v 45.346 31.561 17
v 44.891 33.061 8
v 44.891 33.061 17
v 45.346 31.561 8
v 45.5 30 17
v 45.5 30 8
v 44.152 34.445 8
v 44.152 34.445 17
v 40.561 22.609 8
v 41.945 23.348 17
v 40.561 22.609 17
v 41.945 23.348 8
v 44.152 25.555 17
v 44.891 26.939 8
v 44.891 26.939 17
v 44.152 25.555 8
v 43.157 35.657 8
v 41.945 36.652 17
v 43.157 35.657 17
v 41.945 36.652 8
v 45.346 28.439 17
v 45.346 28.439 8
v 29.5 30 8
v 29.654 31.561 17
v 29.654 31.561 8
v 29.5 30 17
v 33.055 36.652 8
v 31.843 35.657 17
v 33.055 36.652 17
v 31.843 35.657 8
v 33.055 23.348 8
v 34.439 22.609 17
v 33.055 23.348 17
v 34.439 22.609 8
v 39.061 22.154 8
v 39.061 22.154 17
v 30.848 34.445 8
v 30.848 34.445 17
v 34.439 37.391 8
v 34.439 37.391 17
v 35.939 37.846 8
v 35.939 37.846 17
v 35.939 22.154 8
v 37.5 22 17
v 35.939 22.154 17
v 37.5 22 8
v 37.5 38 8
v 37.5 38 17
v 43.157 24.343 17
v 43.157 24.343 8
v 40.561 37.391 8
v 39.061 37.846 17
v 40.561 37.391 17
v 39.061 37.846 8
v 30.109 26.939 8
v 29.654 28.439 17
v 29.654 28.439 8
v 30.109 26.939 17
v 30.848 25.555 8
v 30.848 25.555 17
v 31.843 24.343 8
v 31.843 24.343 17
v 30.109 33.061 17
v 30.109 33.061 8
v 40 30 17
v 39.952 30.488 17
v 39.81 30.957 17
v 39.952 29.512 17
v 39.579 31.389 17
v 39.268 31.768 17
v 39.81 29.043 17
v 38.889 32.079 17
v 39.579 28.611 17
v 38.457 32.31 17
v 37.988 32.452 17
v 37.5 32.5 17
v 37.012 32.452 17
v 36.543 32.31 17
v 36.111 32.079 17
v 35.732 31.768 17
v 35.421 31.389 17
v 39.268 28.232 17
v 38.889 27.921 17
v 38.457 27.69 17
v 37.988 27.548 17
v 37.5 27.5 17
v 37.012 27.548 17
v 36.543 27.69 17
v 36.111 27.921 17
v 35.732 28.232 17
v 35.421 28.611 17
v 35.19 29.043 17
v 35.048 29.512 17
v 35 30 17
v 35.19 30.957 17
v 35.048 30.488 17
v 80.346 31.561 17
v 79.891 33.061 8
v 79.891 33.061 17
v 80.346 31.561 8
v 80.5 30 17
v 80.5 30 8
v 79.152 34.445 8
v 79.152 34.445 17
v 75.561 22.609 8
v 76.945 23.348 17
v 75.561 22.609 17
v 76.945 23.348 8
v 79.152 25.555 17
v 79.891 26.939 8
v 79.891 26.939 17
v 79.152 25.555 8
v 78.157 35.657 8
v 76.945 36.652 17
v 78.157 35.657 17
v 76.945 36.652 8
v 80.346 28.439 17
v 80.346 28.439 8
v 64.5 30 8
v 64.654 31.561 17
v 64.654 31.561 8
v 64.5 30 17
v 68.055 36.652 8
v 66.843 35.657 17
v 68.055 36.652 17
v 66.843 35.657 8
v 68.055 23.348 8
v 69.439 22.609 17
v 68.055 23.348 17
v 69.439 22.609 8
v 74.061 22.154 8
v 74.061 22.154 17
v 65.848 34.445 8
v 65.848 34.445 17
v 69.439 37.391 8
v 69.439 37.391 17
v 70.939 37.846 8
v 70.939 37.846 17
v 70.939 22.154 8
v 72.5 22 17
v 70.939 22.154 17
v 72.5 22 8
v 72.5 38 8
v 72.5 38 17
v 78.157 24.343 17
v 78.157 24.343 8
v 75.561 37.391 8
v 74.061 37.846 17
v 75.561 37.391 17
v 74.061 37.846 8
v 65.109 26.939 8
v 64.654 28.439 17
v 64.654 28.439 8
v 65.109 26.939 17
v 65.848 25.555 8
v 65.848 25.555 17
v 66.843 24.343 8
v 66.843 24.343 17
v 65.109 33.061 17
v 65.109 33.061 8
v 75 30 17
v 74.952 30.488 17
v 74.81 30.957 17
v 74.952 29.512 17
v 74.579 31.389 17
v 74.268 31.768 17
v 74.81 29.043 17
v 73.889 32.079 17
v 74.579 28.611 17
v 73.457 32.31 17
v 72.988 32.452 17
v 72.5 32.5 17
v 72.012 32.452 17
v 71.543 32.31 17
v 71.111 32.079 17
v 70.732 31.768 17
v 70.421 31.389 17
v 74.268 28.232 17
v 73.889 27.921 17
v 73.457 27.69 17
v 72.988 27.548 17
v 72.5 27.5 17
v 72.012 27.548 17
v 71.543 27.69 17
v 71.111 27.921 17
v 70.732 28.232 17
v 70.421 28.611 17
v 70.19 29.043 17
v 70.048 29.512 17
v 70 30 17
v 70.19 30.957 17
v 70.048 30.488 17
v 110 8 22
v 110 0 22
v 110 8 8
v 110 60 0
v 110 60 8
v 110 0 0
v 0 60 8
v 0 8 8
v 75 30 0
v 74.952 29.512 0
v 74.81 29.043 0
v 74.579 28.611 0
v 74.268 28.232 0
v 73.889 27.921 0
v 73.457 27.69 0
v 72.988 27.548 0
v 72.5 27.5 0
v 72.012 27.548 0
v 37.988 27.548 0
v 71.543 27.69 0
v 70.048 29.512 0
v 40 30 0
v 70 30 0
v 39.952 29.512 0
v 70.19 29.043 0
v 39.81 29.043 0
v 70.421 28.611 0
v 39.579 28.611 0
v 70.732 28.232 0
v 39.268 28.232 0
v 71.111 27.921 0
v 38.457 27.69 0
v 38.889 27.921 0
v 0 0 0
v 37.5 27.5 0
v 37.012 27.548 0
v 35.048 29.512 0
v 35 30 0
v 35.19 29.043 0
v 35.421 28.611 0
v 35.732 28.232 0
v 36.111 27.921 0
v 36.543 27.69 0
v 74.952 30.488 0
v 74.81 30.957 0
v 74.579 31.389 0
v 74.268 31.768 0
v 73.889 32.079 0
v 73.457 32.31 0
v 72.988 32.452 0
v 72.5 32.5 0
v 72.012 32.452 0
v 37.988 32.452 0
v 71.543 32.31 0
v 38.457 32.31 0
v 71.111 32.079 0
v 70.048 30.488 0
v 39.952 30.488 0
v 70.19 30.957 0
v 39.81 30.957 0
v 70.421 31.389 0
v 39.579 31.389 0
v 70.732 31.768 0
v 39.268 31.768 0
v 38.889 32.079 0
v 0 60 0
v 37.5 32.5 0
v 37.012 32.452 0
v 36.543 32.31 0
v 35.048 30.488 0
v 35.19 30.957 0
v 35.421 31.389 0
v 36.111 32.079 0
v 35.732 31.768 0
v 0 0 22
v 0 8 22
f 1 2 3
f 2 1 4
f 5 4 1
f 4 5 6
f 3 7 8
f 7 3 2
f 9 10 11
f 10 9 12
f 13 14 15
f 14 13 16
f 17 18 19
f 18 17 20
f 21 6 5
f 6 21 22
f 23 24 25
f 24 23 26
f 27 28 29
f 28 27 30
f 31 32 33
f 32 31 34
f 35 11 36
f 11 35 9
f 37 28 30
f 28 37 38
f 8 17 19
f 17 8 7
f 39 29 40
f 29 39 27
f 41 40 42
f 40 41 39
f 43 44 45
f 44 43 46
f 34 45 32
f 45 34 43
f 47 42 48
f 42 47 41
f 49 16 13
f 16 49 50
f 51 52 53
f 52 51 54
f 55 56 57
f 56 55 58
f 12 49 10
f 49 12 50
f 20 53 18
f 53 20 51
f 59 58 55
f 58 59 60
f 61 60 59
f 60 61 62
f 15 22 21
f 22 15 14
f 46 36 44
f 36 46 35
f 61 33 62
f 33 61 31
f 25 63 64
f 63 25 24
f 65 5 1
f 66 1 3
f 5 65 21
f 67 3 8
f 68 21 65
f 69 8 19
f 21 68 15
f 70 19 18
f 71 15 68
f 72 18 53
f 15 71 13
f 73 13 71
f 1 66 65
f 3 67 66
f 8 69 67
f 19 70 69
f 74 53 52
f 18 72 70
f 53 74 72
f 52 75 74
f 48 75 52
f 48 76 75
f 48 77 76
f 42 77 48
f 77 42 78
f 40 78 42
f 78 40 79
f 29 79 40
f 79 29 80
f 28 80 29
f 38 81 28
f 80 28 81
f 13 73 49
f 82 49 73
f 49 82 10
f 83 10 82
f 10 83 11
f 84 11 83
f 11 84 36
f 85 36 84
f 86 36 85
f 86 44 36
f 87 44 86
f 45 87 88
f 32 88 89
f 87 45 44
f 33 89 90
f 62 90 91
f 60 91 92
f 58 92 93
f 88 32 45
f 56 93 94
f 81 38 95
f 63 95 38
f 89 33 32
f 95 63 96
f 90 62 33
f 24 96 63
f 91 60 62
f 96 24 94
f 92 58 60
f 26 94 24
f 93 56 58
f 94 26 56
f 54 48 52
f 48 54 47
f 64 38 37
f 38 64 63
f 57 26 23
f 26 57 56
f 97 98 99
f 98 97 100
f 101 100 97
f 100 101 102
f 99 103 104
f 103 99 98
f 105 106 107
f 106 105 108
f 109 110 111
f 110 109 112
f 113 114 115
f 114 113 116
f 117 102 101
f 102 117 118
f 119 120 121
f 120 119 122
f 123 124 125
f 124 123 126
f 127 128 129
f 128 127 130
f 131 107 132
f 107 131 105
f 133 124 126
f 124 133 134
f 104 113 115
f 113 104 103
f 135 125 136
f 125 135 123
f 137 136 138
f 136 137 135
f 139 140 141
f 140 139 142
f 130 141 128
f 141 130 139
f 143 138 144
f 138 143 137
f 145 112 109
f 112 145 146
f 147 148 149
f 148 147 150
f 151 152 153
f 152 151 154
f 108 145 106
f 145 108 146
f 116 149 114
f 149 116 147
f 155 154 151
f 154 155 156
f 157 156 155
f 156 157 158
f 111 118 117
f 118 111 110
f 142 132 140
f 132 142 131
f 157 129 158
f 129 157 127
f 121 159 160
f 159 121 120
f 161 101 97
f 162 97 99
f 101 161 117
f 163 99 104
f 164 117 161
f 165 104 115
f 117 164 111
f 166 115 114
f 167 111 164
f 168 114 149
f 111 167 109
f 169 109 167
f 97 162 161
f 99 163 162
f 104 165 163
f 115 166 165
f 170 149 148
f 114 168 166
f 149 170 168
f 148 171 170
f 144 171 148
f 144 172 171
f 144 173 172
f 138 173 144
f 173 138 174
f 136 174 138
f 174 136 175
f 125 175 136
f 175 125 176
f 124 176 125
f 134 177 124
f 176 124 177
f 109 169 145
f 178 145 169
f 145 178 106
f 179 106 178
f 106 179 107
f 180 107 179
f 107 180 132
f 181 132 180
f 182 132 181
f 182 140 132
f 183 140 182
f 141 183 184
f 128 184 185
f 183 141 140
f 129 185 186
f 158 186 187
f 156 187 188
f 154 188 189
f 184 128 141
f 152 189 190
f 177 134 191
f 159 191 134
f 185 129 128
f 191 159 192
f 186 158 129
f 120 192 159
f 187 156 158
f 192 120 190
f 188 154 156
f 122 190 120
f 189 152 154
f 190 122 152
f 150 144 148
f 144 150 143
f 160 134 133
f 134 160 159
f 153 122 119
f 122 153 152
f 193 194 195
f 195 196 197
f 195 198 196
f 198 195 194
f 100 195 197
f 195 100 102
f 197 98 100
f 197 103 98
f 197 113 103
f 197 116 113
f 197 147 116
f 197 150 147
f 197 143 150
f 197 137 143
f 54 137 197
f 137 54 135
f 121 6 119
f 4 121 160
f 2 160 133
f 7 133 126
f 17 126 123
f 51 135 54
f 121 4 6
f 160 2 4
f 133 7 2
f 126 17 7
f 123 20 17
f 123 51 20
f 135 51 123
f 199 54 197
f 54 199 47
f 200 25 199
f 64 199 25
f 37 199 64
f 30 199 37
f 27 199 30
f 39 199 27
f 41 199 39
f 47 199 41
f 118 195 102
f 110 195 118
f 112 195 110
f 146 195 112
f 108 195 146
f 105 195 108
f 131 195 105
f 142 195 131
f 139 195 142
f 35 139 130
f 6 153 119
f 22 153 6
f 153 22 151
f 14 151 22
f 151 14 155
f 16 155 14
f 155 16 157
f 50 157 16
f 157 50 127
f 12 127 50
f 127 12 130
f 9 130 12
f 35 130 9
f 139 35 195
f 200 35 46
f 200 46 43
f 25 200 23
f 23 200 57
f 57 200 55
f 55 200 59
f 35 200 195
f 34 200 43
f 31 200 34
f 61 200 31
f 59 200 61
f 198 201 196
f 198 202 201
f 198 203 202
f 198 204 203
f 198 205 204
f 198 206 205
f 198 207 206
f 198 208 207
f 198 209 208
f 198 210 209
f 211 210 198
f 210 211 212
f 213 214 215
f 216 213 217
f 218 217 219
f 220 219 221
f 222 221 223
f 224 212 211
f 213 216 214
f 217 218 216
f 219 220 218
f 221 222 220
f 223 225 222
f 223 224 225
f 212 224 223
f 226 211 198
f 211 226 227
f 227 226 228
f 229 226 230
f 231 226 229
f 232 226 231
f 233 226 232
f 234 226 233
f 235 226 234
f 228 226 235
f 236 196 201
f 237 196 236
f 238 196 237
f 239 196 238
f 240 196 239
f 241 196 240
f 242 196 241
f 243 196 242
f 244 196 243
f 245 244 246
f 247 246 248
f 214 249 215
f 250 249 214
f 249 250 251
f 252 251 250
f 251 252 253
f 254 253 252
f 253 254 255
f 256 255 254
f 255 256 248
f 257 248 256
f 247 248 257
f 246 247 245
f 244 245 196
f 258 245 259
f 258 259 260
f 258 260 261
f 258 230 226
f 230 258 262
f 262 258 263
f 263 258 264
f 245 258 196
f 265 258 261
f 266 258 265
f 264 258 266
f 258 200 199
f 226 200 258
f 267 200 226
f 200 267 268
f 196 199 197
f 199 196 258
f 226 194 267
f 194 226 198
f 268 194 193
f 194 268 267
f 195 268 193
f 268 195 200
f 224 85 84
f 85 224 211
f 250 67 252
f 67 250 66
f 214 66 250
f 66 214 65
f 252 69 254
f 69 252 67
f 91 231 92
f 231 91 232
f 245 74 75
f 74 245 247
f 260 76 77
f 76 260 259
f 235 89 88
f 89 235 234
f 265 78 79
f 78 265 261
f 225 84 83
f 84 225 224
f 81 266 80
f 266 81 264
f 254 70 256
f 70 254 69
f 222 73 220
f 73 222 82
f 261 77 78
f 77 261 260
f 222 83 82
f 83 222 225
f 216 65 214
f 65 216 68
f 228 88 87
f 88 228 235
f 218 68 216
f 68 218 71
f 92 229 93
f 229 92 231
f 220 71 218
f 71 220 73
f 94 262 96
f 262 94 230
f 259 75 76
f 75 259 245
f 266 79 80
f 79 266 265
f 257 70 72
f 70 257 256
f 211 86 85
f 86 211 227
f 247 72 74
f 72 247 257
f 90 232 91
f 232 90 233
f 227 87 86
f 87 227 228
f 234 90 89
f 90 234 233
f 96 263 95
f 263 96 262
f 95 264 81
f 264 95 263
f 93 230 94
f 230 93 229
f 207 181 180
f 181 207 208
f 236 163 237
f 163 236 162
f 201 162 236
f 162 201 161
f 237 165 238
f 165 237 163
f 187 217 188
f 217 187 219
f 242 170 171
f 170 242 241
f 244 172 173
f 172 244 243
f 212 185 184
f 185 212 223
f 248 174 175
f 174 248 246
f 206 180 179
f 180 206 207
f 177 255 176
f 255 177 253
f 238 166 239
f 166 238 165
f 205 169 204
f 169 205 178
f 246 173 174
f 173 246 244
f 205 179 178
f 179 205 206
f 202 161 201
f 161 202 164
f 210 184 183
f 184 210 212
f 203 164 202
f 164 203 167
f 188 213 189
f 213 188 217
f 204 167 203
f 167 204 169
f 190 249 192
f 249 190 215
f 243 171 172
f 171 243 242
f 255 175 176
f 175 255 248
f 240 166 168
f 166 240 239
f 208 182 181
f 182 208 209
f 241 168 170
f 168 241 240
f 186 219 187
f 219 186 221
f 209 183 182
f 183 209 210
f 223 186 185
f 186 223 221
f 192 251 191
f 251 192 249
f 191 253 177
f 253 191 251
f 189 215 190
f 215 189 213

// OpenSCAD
$fn = 32;

// ----------------------------------------------------------------------
// Drill jig: fence jig
// ----------------------------------------------------------------------

// --- parameters (mm) ---
plate_l = 110;            // plate length, X
plate_w = 60;             // plate width, Y
plate_t = 8;              // plate thickness
boss_d = 16;              // guide boss diameter
boss_h = 10;              // boss height above the plate
guide_d = 5;              // guide hole diameter
boss_pitch = 35;          // boss pitch
fence_h = 15;             // fence height above the plate
fence_t = 8;              // fence thickness

n_boss = 2;  // guide bosses
boss_x0 = (plate_l - (n_boss - 1) * boss_pitch) / 2;  // first boss X
boss_top = plate_t - 1 + boss_h;  // boss crown height
fence_top = plate_t - 1 + fence_h;  // fence crown height
total_h = max([fence_top, boss_top]);  // overall height

difference() {
  union() {
  cube([plate_l, plate_w, plate_t]);
  for (i = [0 : n_boss - 1])
    translate([boss_x0 + i * boss_pitch, plate_w / 2, plate_t - 1])
      cylinder(h = boss_h, d = boss_d);
  translate([0, 0, plate_t - 1]) cube([plate_l, fence_t, fence_h]);
  }
  for (i = [0 : n_boss - 1])
    translate([boss_x0 + i * boss_pitch, plate_w / 2, -1])
      cylinder(h = plate_t + boss_h, d = guide_d);
}
